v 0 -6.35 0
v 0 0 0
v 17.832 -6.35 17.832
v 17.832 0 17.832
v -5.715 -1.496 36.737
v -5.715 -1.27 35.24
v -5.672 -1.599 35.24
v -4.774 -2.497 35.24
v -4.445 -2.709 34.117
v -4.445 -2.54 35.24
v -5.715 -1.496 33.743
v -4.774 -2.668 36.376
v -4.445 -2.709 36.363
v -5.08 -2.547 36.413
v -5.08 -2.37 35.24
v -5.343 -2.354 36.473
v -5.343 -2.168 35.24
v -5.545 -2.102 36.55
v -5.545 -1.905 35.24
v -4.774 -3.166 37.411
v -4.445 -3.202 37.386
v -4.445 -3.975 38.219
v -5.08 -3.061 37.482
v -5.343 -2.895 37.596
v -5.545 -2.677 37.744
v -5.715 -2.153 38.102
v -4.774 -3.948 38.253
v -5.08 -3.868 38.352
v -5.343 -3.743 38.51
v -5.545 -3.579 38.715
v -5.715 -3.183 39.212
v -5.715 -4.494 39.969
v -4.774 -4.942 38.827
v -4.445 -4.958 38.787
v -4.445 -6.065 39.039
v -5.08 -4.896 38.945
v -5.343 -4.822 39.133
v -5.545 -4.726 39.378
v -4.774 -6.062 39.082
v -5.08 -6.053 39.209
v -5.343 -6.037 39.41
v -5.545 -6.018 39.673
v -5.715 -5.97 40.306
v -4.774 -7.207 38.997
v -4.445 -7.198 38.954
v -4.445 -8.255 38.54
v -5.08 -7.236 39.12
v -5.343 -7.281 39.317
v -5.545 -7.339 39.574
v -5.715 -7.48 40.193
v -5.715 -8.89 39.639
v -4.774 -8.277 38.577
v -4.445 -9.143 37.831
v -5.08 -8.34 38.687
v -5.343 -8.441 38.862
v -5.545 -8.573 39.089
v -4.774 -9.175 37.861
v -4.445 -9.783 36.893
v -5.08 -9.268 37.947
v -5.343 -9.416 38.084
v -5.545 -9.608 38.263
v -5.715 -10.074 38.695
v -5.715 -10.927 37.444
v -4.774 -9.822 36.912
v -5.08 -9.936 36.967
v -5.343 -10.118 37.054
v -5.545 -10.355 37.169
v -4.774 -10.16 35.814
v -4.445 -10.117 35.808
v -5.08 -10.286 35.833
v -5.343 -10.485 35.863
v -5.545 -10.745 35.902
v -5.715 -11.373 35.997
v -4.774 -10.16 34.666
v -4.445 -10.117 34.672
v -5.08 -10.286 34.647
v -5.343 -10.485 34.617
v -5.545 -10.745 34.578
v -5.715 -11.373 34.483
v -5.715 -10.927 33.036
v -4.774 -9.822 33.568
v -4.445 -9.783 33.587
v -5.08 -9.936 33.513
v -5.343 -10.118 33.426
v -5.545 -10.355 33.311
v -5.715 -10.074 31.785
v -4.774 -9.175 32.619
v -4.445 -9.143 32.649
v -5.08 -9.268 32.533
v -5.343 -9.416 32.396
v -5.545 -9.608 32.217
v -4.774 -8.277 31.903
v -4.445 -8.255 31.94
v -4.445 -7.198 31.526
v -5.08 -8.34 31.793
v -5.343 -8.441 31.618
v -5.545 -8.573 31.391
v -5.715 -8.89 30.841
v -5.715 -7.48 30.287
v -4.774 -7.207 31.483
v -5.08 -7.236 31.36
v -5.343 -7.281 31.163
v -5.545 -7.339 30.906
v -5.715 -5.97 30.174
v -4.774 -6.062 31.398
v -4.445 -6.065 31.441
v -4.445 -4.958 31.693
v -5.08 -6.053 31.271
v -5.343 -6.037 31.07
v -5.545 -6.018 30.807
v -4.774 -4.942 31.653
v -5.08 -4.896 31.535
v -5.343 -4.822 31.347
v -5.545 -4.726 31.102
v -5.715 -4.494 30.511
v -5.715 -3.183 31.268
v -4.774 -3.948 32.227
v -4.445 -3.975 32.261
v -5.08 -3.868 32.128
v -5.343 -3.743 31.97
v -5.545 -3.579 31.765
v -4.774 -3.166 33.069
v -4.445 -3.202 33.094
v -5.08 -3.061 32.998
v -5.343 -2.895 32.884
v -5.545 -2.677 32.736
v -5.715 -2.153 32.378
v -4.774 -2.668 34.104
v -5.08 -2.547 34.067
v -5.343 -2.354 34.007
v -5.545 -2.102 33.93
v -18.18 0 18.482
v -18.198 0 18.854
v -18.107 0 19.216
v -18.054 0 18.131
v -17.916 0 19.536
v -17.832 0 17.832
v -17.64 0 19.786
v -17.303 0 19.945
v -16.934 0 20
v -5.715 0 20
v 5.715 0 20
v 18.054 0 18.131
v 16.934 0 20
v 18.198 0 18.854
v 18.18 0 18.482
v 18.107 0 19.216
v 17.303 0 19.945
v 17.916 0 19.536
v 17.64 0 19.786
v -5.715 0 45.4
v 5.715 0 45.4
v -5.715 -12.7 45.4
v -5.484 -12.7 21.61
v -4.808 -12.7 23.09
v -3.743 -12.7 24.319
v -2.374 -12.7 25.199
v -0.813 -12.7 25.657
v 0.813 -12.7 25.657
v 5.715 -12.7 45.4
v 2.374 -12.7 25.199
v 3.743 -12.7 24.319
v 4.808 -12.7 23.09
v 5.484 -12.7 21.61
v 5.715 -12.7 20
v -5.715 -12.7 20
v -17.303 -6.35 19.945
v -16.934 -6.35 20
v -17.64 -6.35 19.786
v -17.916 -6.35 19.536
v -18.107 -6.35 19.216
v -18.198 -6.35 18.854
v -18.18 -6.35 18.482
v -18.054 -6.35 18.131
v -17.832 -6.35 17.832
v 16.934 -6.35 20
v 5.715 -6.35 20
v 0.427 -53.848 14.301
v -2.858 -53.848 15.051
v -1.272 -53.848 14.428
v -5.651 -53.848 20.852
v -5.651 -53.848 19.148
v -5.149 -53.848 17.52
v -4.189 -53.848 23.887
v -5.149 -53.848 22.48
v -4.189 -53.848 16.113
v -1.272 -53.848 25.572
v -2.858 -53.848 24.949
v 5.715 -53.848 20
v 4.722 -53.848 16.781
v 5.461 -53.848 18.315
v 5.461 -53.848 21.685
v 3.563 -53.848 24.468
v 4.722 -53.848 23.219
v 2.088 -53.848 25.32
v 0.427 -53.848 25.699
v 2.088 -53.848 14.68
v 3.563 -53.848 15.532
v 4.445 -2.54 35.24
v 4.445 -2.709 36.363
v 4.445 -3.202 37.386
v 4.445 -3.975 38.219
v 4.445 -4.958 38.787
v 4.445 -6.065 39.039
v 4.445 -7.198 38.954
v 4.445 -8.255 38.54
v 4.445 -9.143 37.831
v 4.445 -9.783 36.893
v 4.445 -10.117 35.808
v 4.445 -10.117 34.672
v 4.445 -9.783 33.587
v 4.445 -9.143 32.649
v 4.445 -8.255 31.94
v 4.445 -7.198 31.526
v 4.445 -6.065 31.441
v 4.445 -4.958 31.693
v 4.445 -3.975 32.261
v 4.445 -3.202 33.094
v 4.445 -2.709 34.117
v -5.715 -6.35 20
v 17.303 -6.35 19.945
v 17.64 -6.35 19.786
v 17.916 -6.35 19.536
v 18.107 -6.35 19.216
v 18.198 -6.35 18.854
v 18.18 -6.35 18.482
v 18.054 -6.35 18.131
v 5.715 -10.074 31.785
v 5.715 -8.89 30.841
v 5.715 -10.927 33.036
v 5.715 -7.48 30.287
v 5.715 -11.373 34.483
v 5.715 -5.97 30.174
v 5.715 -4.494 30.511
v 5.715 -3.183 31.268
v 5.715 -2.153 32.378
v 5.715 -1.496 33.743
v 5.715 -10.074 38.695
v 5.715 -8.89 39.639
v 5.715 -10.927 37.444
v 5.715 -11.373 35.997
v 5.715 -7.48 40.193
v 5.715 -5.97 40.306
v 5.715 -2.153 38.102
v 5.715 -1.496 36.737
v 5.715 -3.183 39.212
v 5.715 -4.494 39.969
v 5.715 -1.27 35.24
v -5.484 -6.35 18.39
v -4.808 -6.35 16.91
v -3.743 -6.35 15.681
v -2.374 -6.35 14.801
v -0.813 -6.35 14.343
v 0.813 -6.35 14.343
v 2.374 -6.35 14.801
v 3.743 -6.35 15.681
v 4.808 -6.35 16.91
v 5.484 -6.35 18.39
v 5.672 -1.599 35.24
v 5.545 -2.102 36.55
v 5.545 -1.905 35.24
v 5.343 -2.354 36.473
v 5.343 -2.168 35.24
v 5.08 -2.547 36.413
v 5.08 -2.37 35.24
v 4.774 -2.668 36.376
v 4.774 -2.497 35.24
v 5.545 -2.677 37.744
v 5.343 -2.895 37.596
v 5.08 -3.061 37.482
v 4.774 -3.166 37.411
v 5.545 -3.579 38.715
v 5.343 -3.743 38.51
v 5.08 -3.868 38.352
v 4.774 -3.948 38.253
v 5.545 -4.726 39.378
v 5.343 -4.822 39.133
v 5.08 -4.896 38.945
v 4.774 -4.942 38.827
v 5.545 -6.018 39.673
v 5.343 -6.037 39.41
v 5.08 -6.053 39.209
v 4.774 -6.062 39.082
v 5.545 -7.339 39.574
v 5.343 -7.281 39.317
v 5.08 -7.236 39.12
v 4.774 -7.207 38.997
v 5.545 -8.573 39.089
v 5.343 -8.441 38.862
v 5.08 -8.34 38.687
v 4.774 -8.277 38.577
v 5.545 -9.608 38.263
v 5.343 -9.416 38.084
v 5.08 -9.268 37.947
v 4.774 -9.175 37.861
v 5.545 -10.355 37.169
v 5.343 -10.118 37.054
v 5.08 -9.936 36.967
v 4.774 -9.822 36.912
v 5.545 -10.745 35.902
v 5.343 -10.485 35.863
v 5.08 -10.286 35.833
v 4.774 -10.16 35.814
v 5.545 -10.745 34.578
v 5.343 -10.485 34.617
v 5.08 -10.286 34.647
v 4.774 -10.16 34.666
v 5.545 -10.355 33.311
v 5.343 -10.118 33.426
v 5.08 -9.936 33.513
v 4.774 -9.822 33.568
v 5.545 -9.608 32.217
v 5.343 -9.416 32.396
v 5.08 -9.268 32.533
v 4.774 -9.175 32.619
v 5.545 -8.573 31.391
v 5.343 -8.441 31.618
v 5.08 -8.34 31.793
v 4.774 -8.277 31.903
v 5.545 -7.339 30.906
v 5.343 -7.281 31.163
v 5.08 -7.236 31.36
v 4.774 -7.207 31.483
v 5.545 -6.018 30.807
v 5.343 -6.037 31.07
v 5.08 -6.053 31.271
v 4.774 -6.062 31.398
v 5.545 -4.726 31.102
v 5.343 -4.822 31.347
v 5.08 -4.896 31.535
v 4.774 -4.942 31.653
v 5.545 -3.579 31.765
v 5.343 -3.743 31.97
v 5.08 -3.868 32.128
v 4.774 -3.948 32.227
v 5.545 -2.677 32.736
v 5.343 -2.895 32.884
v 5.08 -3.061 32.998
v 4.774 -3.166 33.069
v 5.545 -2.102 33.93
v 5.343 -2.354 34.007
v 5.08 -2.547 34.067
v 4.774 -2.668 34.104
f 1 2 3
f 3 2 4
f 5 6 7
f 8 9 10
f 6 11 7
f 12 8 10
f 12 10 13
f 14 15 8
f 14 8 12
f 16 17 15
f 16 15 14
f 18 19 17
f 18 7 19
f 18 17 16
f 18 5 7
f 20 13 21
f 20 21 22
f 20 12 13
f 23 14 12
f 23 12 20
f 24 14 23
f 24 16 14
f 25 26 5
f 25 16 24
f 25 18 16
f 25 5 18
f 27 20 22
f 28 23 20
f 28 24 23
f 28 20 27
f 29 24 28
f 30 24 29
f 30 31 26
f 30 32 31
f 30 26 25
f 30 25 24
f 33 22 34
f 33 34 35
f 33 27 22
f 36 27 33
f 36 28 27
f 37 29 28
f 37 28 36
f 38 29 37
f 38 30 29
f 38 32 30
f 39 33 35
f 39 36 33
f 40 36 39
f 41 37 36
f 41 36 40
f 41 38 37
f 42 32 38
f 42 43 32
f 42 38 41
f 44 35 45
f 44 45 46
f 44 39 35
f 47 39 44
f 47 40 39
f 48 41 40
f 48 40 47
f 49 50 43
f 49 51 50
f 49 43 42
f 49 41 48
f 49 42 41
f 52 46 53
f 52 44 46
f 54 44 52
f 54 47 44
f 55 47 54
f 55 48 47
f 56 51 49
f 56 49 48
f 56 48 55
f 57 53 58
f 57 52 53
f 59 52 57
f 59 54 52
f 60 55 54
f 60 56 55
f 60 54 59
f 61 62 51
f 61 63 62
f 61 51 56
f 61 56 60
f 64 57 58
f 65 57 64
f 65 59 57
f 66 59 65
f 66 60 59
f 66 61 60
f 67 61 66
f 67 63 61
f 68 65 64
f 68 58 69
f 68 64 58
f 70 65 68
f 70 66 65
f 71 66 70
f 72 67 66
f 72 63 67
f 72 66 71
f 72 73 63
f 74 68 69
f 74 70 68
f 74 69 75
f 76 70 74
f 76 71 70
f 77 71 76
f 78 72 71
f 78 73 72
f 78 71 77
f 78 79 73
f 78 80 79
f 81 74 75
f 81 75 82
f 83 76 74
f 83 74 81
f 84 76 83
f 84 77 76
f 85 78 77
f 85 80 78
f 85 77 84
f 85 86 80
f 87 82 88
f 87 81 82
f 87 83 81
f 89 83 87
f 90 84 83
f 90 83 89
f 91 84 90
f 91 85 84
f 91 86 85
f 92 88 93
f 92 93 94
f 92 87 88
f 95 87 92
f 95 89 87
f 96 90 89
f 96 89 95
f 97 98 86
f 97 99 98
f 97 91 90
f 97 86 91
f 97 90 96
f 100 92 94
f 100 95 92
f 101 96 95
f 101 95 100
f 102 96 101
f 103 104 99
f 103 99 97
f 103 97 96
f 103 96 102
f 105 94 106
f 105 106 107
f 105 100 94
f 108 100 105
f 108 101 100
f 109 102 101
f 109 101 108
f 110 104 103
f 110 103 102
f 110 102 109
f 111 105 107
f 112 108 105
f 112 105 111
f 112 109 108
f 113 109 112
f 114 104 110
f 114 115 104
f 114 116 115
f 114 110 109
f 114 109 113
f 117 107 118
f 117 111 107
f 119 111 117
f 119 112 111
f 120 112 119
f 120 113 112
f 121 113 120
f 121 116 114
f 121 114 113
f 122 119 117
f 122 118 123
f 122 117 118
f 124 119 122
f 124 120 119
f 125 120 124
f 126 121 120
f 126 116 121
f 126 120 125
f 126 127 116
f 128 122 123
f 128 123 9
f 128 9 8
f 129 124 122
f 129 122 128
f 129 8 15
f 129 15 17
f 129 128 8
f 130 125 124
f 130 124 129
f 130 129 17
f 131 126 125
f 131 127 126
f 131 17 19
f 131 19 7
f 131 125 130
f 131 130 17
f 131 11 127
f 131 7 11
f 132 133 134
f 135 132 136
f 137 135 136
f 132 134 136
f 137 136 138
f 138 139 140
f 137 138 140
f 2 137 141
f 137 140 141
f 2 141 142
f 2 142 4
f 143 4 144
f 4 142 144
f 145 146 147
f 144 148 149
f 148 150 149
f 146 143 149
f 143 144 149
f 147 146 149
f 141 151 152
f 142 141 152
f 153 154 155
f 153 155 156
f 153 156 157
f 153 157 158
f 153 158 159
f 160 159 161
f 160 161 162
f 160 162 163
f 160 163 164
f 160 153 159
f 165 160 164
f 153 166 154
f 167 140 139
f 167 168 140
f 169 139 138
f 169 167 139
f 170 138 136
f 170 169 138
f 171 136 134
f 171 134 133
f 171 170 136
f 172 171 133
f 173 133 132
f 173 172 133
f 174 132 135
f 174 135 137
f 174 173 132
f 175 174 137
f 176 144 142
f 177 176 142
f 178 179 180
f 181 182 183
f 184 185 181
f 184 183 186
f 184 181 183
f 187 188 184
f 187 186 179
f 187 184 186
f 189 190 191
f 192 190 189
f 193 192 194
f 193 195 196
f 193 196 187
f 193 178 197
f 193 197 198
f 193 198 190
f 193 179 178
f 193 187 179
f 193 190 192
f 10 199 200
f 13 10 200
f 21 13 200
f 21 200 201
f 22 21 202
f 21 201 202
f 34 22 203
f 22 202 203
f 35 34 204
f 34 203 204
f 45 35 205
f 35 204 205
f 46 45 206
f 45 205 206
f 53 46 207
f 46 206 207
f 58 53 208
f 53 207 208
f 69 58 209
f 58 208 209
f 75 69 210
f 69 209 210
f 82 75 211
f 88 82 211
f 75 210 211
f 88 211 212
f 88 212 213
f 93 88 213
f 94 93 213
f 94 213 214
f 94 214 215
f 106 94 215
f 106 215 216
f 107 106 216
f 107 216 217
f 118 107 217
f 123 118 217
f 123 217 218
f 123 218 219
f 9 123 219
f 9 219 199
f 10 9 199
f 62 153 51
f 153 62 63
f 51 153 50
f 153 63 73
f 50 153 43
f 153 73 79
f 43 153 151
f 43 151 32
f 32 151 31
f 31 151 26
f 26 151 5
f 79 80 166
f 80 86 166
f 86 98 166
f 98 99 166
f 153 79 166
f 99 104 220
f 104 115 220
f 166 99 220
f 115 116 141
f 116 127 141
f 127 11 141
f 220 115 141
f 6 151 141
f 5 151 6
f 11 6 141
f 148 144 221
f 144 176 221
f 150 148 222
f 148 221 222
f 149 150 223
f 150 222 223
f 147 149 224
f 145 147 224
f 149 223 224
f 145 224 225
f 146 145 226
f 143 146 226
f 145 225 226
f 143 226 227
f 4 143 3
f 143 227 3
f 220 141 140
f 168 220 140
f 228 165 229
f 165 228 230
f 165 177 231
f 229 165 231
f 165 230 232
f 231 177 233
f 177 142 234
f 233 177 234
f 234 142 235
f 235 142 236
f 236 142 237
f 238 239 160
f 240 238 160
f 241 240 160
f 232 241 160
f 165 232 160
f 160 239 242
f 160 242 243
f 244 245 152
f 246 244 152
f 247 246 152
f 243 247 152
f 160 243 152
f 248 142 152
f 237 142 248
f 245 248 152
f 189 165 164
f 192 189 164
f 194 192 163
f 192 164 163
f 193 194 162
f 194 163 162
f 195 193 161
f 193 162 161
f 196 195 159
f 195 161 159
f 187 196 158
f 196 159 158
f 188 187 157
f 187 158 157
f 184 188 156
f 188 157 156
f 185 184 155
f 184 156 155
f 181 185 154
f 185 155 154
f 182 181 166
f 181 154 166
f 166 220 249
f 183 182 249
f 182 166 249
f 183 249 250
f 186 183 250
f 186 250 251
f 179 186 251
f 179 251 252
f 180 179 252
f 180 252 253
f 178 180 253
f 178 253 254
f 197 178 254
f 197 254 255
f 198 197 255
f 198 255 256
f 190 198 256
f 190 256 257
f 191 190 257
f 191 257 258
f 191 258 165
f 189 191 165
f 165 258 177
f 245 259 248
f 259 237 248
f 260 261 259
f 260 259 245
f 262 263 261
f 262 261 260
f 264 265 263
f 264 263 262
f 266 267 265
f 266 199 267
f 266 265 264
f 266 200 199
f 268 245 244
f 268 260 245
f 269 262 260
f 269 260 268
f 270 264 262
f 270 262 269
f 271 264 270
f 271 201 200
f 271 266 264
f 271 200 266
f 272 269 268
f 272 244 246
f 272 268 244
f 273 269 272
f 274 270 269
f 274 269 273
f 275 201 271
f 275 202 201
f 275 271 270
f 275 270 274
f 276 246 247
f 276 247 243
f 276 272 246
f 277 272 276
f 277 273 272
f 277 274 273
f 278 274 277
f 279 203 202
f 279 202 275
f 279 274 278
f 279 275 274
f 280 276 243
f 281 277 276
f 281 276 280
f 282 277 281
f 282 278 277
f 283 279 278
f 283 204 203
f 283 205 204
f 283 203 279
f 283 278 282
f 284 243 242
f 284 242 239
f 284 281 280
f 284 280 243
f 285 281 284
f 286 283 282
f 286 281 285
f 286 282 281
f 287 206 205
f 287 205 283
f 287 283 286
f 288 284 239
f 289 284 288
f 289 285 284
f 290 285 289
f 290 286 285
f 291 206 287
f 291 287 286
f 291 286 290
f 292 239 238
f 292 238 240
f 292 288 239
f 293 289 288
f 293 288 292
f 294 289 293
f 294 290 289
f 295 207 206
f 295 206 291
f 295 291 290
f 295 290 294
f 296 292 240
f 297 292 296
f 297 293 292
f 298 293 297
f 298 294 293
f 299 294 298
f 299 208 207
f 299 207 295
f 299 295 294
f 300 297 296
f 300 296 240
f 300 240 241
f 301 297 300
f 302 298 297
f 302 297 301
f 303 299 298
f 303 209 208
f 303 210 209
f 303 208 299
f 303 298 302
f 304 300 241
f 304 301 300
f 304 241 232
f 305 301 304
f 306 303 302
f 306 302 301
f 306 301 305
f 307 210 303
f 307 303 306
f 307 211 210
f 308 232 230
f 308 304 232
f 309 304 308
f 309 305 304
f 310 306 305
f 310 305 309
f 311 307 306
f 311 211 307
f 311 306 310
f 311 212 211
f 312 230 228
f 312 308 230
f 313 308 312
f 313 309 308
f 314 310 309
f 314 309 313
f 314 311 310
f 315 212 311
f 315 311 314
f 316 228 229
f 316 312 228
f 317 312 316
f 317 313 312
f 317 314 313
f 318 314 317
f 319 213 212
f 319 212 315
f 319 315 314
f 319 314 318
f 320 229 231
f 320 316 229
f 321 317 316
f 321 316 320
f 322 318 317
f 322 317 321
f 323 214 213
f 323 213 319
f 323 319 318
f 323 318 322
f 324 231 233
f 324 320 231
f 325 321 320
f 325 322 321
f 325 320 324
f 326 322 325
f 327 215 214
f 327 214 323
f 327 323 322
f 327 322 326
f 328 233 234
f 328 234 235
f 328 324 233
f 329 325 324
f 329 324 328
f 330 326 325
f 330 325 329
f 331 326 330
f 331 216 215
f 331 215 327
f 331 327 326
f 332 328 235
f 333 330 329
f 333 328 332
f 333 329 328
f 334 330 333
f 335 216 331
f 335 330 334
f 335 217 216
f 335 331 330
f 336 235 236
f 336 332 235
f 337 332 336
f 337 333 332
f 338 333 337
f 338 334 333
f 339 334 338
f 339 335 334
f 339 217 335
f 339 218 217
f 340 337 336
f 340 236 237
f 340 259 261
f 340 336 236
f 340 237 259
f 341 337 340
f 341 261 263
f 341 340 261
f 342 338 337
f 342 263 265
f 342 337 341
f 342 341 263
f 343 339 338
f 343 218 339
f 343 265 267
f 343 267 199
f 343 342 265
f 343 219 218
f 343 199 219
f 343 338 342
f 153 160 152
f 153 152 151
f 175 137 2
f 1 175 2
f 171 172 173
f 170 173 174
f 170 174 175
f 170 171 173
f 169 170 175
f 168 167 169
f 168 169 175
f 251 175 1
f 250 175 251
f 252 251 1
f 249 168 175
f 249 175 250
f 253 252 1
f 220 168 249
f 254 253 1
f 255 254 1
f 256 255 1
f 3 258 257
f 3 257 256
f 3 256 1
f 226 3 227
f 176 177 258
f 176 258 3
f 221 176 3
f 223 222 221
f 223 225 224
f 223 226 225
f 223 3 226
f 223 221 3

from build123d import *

# Parameters (mm, degrees)
F1_DEPTH = 6.35
F2_DEPTH = 53.848
F3_DEPTH = 12.7
F5_R     = 3.81
F6_DEPTH = 51.116
F7_R     = 1.27
F8_R     = 1.27


with BuildPart() as f1:
    # F0 (on Front) → F1 (new body)
    with BuildSketch(Plane.XZ):
        with BuildLine():
            Line((-20, 20), (0, 0))
            Line((0, 0), (20, 20))
            Line((20, 20), (5.715, 20))
            ThreePointArc((5.715, 20), (0, 14.285), (-5.715, 20))
            Line((-5.715, 20), (-20, 20))
        make_face()
    extrude(amount=F1_DEPTH)

    # F0 (on Front) → F2 (join)
    with BuildSketch(Plane.XZ):
        with BuildLine():
            ThreePointArc((-5.715, 20), (0, 14.285), (5.715, 20))
            Line((5.715, 20), (-5.715, 20))
        make_face()
        with BuildLine():
            Line((-5.715, 20), (5.715, 20))
            ThreePointArc((5.715, 20), (0, 25.715), (-5.715, 20))
        make_face()
    extrude(amount=F2_DEPTH)

    # F0 (on Front) → F3 (join)
    with BuildSketch(Plane.XZ):
        with BuildLine():
            ThreePointArc((-5.715, 20), (0, 25.715), (5.715, 20))
            Line((5.715, 20), (5.715, 45.4))
            Line((5.715, 45.4), (-5.715, 45.4))
            Line((-5.715, 45.4), (-5.715, 20))
        make_face()
    extrude(amount=F3_DEPTH)

    # F5 (on offset) → F6 (cut, through all)
    with BuildSketch(Plane.YZ.offset(31.115)):
        with Locations((-6.35, 35.24)):
            Circle(F5_R)
    extrude(amount=-F6_DEPTH, mode=Mode.SUBTRACT)

    # F7
    f7_edges = [f1.edges().sort_by_distance(p)[0] for p in [
        (5.715, -10.16, 35.24),
        (-5.715, -10.16, 35.24),
    ]]
    fillet(f7_edges, radius=F7_R)

    # F8
    f8_edges = [f1.edges().sort_by_distance(p)[0] for p in [
        (-20, -3.175, 20),
        (20, -3.175, 20),
    ]]
    fillet(f8_edges, radius=F8_R)


solid = f1.part
